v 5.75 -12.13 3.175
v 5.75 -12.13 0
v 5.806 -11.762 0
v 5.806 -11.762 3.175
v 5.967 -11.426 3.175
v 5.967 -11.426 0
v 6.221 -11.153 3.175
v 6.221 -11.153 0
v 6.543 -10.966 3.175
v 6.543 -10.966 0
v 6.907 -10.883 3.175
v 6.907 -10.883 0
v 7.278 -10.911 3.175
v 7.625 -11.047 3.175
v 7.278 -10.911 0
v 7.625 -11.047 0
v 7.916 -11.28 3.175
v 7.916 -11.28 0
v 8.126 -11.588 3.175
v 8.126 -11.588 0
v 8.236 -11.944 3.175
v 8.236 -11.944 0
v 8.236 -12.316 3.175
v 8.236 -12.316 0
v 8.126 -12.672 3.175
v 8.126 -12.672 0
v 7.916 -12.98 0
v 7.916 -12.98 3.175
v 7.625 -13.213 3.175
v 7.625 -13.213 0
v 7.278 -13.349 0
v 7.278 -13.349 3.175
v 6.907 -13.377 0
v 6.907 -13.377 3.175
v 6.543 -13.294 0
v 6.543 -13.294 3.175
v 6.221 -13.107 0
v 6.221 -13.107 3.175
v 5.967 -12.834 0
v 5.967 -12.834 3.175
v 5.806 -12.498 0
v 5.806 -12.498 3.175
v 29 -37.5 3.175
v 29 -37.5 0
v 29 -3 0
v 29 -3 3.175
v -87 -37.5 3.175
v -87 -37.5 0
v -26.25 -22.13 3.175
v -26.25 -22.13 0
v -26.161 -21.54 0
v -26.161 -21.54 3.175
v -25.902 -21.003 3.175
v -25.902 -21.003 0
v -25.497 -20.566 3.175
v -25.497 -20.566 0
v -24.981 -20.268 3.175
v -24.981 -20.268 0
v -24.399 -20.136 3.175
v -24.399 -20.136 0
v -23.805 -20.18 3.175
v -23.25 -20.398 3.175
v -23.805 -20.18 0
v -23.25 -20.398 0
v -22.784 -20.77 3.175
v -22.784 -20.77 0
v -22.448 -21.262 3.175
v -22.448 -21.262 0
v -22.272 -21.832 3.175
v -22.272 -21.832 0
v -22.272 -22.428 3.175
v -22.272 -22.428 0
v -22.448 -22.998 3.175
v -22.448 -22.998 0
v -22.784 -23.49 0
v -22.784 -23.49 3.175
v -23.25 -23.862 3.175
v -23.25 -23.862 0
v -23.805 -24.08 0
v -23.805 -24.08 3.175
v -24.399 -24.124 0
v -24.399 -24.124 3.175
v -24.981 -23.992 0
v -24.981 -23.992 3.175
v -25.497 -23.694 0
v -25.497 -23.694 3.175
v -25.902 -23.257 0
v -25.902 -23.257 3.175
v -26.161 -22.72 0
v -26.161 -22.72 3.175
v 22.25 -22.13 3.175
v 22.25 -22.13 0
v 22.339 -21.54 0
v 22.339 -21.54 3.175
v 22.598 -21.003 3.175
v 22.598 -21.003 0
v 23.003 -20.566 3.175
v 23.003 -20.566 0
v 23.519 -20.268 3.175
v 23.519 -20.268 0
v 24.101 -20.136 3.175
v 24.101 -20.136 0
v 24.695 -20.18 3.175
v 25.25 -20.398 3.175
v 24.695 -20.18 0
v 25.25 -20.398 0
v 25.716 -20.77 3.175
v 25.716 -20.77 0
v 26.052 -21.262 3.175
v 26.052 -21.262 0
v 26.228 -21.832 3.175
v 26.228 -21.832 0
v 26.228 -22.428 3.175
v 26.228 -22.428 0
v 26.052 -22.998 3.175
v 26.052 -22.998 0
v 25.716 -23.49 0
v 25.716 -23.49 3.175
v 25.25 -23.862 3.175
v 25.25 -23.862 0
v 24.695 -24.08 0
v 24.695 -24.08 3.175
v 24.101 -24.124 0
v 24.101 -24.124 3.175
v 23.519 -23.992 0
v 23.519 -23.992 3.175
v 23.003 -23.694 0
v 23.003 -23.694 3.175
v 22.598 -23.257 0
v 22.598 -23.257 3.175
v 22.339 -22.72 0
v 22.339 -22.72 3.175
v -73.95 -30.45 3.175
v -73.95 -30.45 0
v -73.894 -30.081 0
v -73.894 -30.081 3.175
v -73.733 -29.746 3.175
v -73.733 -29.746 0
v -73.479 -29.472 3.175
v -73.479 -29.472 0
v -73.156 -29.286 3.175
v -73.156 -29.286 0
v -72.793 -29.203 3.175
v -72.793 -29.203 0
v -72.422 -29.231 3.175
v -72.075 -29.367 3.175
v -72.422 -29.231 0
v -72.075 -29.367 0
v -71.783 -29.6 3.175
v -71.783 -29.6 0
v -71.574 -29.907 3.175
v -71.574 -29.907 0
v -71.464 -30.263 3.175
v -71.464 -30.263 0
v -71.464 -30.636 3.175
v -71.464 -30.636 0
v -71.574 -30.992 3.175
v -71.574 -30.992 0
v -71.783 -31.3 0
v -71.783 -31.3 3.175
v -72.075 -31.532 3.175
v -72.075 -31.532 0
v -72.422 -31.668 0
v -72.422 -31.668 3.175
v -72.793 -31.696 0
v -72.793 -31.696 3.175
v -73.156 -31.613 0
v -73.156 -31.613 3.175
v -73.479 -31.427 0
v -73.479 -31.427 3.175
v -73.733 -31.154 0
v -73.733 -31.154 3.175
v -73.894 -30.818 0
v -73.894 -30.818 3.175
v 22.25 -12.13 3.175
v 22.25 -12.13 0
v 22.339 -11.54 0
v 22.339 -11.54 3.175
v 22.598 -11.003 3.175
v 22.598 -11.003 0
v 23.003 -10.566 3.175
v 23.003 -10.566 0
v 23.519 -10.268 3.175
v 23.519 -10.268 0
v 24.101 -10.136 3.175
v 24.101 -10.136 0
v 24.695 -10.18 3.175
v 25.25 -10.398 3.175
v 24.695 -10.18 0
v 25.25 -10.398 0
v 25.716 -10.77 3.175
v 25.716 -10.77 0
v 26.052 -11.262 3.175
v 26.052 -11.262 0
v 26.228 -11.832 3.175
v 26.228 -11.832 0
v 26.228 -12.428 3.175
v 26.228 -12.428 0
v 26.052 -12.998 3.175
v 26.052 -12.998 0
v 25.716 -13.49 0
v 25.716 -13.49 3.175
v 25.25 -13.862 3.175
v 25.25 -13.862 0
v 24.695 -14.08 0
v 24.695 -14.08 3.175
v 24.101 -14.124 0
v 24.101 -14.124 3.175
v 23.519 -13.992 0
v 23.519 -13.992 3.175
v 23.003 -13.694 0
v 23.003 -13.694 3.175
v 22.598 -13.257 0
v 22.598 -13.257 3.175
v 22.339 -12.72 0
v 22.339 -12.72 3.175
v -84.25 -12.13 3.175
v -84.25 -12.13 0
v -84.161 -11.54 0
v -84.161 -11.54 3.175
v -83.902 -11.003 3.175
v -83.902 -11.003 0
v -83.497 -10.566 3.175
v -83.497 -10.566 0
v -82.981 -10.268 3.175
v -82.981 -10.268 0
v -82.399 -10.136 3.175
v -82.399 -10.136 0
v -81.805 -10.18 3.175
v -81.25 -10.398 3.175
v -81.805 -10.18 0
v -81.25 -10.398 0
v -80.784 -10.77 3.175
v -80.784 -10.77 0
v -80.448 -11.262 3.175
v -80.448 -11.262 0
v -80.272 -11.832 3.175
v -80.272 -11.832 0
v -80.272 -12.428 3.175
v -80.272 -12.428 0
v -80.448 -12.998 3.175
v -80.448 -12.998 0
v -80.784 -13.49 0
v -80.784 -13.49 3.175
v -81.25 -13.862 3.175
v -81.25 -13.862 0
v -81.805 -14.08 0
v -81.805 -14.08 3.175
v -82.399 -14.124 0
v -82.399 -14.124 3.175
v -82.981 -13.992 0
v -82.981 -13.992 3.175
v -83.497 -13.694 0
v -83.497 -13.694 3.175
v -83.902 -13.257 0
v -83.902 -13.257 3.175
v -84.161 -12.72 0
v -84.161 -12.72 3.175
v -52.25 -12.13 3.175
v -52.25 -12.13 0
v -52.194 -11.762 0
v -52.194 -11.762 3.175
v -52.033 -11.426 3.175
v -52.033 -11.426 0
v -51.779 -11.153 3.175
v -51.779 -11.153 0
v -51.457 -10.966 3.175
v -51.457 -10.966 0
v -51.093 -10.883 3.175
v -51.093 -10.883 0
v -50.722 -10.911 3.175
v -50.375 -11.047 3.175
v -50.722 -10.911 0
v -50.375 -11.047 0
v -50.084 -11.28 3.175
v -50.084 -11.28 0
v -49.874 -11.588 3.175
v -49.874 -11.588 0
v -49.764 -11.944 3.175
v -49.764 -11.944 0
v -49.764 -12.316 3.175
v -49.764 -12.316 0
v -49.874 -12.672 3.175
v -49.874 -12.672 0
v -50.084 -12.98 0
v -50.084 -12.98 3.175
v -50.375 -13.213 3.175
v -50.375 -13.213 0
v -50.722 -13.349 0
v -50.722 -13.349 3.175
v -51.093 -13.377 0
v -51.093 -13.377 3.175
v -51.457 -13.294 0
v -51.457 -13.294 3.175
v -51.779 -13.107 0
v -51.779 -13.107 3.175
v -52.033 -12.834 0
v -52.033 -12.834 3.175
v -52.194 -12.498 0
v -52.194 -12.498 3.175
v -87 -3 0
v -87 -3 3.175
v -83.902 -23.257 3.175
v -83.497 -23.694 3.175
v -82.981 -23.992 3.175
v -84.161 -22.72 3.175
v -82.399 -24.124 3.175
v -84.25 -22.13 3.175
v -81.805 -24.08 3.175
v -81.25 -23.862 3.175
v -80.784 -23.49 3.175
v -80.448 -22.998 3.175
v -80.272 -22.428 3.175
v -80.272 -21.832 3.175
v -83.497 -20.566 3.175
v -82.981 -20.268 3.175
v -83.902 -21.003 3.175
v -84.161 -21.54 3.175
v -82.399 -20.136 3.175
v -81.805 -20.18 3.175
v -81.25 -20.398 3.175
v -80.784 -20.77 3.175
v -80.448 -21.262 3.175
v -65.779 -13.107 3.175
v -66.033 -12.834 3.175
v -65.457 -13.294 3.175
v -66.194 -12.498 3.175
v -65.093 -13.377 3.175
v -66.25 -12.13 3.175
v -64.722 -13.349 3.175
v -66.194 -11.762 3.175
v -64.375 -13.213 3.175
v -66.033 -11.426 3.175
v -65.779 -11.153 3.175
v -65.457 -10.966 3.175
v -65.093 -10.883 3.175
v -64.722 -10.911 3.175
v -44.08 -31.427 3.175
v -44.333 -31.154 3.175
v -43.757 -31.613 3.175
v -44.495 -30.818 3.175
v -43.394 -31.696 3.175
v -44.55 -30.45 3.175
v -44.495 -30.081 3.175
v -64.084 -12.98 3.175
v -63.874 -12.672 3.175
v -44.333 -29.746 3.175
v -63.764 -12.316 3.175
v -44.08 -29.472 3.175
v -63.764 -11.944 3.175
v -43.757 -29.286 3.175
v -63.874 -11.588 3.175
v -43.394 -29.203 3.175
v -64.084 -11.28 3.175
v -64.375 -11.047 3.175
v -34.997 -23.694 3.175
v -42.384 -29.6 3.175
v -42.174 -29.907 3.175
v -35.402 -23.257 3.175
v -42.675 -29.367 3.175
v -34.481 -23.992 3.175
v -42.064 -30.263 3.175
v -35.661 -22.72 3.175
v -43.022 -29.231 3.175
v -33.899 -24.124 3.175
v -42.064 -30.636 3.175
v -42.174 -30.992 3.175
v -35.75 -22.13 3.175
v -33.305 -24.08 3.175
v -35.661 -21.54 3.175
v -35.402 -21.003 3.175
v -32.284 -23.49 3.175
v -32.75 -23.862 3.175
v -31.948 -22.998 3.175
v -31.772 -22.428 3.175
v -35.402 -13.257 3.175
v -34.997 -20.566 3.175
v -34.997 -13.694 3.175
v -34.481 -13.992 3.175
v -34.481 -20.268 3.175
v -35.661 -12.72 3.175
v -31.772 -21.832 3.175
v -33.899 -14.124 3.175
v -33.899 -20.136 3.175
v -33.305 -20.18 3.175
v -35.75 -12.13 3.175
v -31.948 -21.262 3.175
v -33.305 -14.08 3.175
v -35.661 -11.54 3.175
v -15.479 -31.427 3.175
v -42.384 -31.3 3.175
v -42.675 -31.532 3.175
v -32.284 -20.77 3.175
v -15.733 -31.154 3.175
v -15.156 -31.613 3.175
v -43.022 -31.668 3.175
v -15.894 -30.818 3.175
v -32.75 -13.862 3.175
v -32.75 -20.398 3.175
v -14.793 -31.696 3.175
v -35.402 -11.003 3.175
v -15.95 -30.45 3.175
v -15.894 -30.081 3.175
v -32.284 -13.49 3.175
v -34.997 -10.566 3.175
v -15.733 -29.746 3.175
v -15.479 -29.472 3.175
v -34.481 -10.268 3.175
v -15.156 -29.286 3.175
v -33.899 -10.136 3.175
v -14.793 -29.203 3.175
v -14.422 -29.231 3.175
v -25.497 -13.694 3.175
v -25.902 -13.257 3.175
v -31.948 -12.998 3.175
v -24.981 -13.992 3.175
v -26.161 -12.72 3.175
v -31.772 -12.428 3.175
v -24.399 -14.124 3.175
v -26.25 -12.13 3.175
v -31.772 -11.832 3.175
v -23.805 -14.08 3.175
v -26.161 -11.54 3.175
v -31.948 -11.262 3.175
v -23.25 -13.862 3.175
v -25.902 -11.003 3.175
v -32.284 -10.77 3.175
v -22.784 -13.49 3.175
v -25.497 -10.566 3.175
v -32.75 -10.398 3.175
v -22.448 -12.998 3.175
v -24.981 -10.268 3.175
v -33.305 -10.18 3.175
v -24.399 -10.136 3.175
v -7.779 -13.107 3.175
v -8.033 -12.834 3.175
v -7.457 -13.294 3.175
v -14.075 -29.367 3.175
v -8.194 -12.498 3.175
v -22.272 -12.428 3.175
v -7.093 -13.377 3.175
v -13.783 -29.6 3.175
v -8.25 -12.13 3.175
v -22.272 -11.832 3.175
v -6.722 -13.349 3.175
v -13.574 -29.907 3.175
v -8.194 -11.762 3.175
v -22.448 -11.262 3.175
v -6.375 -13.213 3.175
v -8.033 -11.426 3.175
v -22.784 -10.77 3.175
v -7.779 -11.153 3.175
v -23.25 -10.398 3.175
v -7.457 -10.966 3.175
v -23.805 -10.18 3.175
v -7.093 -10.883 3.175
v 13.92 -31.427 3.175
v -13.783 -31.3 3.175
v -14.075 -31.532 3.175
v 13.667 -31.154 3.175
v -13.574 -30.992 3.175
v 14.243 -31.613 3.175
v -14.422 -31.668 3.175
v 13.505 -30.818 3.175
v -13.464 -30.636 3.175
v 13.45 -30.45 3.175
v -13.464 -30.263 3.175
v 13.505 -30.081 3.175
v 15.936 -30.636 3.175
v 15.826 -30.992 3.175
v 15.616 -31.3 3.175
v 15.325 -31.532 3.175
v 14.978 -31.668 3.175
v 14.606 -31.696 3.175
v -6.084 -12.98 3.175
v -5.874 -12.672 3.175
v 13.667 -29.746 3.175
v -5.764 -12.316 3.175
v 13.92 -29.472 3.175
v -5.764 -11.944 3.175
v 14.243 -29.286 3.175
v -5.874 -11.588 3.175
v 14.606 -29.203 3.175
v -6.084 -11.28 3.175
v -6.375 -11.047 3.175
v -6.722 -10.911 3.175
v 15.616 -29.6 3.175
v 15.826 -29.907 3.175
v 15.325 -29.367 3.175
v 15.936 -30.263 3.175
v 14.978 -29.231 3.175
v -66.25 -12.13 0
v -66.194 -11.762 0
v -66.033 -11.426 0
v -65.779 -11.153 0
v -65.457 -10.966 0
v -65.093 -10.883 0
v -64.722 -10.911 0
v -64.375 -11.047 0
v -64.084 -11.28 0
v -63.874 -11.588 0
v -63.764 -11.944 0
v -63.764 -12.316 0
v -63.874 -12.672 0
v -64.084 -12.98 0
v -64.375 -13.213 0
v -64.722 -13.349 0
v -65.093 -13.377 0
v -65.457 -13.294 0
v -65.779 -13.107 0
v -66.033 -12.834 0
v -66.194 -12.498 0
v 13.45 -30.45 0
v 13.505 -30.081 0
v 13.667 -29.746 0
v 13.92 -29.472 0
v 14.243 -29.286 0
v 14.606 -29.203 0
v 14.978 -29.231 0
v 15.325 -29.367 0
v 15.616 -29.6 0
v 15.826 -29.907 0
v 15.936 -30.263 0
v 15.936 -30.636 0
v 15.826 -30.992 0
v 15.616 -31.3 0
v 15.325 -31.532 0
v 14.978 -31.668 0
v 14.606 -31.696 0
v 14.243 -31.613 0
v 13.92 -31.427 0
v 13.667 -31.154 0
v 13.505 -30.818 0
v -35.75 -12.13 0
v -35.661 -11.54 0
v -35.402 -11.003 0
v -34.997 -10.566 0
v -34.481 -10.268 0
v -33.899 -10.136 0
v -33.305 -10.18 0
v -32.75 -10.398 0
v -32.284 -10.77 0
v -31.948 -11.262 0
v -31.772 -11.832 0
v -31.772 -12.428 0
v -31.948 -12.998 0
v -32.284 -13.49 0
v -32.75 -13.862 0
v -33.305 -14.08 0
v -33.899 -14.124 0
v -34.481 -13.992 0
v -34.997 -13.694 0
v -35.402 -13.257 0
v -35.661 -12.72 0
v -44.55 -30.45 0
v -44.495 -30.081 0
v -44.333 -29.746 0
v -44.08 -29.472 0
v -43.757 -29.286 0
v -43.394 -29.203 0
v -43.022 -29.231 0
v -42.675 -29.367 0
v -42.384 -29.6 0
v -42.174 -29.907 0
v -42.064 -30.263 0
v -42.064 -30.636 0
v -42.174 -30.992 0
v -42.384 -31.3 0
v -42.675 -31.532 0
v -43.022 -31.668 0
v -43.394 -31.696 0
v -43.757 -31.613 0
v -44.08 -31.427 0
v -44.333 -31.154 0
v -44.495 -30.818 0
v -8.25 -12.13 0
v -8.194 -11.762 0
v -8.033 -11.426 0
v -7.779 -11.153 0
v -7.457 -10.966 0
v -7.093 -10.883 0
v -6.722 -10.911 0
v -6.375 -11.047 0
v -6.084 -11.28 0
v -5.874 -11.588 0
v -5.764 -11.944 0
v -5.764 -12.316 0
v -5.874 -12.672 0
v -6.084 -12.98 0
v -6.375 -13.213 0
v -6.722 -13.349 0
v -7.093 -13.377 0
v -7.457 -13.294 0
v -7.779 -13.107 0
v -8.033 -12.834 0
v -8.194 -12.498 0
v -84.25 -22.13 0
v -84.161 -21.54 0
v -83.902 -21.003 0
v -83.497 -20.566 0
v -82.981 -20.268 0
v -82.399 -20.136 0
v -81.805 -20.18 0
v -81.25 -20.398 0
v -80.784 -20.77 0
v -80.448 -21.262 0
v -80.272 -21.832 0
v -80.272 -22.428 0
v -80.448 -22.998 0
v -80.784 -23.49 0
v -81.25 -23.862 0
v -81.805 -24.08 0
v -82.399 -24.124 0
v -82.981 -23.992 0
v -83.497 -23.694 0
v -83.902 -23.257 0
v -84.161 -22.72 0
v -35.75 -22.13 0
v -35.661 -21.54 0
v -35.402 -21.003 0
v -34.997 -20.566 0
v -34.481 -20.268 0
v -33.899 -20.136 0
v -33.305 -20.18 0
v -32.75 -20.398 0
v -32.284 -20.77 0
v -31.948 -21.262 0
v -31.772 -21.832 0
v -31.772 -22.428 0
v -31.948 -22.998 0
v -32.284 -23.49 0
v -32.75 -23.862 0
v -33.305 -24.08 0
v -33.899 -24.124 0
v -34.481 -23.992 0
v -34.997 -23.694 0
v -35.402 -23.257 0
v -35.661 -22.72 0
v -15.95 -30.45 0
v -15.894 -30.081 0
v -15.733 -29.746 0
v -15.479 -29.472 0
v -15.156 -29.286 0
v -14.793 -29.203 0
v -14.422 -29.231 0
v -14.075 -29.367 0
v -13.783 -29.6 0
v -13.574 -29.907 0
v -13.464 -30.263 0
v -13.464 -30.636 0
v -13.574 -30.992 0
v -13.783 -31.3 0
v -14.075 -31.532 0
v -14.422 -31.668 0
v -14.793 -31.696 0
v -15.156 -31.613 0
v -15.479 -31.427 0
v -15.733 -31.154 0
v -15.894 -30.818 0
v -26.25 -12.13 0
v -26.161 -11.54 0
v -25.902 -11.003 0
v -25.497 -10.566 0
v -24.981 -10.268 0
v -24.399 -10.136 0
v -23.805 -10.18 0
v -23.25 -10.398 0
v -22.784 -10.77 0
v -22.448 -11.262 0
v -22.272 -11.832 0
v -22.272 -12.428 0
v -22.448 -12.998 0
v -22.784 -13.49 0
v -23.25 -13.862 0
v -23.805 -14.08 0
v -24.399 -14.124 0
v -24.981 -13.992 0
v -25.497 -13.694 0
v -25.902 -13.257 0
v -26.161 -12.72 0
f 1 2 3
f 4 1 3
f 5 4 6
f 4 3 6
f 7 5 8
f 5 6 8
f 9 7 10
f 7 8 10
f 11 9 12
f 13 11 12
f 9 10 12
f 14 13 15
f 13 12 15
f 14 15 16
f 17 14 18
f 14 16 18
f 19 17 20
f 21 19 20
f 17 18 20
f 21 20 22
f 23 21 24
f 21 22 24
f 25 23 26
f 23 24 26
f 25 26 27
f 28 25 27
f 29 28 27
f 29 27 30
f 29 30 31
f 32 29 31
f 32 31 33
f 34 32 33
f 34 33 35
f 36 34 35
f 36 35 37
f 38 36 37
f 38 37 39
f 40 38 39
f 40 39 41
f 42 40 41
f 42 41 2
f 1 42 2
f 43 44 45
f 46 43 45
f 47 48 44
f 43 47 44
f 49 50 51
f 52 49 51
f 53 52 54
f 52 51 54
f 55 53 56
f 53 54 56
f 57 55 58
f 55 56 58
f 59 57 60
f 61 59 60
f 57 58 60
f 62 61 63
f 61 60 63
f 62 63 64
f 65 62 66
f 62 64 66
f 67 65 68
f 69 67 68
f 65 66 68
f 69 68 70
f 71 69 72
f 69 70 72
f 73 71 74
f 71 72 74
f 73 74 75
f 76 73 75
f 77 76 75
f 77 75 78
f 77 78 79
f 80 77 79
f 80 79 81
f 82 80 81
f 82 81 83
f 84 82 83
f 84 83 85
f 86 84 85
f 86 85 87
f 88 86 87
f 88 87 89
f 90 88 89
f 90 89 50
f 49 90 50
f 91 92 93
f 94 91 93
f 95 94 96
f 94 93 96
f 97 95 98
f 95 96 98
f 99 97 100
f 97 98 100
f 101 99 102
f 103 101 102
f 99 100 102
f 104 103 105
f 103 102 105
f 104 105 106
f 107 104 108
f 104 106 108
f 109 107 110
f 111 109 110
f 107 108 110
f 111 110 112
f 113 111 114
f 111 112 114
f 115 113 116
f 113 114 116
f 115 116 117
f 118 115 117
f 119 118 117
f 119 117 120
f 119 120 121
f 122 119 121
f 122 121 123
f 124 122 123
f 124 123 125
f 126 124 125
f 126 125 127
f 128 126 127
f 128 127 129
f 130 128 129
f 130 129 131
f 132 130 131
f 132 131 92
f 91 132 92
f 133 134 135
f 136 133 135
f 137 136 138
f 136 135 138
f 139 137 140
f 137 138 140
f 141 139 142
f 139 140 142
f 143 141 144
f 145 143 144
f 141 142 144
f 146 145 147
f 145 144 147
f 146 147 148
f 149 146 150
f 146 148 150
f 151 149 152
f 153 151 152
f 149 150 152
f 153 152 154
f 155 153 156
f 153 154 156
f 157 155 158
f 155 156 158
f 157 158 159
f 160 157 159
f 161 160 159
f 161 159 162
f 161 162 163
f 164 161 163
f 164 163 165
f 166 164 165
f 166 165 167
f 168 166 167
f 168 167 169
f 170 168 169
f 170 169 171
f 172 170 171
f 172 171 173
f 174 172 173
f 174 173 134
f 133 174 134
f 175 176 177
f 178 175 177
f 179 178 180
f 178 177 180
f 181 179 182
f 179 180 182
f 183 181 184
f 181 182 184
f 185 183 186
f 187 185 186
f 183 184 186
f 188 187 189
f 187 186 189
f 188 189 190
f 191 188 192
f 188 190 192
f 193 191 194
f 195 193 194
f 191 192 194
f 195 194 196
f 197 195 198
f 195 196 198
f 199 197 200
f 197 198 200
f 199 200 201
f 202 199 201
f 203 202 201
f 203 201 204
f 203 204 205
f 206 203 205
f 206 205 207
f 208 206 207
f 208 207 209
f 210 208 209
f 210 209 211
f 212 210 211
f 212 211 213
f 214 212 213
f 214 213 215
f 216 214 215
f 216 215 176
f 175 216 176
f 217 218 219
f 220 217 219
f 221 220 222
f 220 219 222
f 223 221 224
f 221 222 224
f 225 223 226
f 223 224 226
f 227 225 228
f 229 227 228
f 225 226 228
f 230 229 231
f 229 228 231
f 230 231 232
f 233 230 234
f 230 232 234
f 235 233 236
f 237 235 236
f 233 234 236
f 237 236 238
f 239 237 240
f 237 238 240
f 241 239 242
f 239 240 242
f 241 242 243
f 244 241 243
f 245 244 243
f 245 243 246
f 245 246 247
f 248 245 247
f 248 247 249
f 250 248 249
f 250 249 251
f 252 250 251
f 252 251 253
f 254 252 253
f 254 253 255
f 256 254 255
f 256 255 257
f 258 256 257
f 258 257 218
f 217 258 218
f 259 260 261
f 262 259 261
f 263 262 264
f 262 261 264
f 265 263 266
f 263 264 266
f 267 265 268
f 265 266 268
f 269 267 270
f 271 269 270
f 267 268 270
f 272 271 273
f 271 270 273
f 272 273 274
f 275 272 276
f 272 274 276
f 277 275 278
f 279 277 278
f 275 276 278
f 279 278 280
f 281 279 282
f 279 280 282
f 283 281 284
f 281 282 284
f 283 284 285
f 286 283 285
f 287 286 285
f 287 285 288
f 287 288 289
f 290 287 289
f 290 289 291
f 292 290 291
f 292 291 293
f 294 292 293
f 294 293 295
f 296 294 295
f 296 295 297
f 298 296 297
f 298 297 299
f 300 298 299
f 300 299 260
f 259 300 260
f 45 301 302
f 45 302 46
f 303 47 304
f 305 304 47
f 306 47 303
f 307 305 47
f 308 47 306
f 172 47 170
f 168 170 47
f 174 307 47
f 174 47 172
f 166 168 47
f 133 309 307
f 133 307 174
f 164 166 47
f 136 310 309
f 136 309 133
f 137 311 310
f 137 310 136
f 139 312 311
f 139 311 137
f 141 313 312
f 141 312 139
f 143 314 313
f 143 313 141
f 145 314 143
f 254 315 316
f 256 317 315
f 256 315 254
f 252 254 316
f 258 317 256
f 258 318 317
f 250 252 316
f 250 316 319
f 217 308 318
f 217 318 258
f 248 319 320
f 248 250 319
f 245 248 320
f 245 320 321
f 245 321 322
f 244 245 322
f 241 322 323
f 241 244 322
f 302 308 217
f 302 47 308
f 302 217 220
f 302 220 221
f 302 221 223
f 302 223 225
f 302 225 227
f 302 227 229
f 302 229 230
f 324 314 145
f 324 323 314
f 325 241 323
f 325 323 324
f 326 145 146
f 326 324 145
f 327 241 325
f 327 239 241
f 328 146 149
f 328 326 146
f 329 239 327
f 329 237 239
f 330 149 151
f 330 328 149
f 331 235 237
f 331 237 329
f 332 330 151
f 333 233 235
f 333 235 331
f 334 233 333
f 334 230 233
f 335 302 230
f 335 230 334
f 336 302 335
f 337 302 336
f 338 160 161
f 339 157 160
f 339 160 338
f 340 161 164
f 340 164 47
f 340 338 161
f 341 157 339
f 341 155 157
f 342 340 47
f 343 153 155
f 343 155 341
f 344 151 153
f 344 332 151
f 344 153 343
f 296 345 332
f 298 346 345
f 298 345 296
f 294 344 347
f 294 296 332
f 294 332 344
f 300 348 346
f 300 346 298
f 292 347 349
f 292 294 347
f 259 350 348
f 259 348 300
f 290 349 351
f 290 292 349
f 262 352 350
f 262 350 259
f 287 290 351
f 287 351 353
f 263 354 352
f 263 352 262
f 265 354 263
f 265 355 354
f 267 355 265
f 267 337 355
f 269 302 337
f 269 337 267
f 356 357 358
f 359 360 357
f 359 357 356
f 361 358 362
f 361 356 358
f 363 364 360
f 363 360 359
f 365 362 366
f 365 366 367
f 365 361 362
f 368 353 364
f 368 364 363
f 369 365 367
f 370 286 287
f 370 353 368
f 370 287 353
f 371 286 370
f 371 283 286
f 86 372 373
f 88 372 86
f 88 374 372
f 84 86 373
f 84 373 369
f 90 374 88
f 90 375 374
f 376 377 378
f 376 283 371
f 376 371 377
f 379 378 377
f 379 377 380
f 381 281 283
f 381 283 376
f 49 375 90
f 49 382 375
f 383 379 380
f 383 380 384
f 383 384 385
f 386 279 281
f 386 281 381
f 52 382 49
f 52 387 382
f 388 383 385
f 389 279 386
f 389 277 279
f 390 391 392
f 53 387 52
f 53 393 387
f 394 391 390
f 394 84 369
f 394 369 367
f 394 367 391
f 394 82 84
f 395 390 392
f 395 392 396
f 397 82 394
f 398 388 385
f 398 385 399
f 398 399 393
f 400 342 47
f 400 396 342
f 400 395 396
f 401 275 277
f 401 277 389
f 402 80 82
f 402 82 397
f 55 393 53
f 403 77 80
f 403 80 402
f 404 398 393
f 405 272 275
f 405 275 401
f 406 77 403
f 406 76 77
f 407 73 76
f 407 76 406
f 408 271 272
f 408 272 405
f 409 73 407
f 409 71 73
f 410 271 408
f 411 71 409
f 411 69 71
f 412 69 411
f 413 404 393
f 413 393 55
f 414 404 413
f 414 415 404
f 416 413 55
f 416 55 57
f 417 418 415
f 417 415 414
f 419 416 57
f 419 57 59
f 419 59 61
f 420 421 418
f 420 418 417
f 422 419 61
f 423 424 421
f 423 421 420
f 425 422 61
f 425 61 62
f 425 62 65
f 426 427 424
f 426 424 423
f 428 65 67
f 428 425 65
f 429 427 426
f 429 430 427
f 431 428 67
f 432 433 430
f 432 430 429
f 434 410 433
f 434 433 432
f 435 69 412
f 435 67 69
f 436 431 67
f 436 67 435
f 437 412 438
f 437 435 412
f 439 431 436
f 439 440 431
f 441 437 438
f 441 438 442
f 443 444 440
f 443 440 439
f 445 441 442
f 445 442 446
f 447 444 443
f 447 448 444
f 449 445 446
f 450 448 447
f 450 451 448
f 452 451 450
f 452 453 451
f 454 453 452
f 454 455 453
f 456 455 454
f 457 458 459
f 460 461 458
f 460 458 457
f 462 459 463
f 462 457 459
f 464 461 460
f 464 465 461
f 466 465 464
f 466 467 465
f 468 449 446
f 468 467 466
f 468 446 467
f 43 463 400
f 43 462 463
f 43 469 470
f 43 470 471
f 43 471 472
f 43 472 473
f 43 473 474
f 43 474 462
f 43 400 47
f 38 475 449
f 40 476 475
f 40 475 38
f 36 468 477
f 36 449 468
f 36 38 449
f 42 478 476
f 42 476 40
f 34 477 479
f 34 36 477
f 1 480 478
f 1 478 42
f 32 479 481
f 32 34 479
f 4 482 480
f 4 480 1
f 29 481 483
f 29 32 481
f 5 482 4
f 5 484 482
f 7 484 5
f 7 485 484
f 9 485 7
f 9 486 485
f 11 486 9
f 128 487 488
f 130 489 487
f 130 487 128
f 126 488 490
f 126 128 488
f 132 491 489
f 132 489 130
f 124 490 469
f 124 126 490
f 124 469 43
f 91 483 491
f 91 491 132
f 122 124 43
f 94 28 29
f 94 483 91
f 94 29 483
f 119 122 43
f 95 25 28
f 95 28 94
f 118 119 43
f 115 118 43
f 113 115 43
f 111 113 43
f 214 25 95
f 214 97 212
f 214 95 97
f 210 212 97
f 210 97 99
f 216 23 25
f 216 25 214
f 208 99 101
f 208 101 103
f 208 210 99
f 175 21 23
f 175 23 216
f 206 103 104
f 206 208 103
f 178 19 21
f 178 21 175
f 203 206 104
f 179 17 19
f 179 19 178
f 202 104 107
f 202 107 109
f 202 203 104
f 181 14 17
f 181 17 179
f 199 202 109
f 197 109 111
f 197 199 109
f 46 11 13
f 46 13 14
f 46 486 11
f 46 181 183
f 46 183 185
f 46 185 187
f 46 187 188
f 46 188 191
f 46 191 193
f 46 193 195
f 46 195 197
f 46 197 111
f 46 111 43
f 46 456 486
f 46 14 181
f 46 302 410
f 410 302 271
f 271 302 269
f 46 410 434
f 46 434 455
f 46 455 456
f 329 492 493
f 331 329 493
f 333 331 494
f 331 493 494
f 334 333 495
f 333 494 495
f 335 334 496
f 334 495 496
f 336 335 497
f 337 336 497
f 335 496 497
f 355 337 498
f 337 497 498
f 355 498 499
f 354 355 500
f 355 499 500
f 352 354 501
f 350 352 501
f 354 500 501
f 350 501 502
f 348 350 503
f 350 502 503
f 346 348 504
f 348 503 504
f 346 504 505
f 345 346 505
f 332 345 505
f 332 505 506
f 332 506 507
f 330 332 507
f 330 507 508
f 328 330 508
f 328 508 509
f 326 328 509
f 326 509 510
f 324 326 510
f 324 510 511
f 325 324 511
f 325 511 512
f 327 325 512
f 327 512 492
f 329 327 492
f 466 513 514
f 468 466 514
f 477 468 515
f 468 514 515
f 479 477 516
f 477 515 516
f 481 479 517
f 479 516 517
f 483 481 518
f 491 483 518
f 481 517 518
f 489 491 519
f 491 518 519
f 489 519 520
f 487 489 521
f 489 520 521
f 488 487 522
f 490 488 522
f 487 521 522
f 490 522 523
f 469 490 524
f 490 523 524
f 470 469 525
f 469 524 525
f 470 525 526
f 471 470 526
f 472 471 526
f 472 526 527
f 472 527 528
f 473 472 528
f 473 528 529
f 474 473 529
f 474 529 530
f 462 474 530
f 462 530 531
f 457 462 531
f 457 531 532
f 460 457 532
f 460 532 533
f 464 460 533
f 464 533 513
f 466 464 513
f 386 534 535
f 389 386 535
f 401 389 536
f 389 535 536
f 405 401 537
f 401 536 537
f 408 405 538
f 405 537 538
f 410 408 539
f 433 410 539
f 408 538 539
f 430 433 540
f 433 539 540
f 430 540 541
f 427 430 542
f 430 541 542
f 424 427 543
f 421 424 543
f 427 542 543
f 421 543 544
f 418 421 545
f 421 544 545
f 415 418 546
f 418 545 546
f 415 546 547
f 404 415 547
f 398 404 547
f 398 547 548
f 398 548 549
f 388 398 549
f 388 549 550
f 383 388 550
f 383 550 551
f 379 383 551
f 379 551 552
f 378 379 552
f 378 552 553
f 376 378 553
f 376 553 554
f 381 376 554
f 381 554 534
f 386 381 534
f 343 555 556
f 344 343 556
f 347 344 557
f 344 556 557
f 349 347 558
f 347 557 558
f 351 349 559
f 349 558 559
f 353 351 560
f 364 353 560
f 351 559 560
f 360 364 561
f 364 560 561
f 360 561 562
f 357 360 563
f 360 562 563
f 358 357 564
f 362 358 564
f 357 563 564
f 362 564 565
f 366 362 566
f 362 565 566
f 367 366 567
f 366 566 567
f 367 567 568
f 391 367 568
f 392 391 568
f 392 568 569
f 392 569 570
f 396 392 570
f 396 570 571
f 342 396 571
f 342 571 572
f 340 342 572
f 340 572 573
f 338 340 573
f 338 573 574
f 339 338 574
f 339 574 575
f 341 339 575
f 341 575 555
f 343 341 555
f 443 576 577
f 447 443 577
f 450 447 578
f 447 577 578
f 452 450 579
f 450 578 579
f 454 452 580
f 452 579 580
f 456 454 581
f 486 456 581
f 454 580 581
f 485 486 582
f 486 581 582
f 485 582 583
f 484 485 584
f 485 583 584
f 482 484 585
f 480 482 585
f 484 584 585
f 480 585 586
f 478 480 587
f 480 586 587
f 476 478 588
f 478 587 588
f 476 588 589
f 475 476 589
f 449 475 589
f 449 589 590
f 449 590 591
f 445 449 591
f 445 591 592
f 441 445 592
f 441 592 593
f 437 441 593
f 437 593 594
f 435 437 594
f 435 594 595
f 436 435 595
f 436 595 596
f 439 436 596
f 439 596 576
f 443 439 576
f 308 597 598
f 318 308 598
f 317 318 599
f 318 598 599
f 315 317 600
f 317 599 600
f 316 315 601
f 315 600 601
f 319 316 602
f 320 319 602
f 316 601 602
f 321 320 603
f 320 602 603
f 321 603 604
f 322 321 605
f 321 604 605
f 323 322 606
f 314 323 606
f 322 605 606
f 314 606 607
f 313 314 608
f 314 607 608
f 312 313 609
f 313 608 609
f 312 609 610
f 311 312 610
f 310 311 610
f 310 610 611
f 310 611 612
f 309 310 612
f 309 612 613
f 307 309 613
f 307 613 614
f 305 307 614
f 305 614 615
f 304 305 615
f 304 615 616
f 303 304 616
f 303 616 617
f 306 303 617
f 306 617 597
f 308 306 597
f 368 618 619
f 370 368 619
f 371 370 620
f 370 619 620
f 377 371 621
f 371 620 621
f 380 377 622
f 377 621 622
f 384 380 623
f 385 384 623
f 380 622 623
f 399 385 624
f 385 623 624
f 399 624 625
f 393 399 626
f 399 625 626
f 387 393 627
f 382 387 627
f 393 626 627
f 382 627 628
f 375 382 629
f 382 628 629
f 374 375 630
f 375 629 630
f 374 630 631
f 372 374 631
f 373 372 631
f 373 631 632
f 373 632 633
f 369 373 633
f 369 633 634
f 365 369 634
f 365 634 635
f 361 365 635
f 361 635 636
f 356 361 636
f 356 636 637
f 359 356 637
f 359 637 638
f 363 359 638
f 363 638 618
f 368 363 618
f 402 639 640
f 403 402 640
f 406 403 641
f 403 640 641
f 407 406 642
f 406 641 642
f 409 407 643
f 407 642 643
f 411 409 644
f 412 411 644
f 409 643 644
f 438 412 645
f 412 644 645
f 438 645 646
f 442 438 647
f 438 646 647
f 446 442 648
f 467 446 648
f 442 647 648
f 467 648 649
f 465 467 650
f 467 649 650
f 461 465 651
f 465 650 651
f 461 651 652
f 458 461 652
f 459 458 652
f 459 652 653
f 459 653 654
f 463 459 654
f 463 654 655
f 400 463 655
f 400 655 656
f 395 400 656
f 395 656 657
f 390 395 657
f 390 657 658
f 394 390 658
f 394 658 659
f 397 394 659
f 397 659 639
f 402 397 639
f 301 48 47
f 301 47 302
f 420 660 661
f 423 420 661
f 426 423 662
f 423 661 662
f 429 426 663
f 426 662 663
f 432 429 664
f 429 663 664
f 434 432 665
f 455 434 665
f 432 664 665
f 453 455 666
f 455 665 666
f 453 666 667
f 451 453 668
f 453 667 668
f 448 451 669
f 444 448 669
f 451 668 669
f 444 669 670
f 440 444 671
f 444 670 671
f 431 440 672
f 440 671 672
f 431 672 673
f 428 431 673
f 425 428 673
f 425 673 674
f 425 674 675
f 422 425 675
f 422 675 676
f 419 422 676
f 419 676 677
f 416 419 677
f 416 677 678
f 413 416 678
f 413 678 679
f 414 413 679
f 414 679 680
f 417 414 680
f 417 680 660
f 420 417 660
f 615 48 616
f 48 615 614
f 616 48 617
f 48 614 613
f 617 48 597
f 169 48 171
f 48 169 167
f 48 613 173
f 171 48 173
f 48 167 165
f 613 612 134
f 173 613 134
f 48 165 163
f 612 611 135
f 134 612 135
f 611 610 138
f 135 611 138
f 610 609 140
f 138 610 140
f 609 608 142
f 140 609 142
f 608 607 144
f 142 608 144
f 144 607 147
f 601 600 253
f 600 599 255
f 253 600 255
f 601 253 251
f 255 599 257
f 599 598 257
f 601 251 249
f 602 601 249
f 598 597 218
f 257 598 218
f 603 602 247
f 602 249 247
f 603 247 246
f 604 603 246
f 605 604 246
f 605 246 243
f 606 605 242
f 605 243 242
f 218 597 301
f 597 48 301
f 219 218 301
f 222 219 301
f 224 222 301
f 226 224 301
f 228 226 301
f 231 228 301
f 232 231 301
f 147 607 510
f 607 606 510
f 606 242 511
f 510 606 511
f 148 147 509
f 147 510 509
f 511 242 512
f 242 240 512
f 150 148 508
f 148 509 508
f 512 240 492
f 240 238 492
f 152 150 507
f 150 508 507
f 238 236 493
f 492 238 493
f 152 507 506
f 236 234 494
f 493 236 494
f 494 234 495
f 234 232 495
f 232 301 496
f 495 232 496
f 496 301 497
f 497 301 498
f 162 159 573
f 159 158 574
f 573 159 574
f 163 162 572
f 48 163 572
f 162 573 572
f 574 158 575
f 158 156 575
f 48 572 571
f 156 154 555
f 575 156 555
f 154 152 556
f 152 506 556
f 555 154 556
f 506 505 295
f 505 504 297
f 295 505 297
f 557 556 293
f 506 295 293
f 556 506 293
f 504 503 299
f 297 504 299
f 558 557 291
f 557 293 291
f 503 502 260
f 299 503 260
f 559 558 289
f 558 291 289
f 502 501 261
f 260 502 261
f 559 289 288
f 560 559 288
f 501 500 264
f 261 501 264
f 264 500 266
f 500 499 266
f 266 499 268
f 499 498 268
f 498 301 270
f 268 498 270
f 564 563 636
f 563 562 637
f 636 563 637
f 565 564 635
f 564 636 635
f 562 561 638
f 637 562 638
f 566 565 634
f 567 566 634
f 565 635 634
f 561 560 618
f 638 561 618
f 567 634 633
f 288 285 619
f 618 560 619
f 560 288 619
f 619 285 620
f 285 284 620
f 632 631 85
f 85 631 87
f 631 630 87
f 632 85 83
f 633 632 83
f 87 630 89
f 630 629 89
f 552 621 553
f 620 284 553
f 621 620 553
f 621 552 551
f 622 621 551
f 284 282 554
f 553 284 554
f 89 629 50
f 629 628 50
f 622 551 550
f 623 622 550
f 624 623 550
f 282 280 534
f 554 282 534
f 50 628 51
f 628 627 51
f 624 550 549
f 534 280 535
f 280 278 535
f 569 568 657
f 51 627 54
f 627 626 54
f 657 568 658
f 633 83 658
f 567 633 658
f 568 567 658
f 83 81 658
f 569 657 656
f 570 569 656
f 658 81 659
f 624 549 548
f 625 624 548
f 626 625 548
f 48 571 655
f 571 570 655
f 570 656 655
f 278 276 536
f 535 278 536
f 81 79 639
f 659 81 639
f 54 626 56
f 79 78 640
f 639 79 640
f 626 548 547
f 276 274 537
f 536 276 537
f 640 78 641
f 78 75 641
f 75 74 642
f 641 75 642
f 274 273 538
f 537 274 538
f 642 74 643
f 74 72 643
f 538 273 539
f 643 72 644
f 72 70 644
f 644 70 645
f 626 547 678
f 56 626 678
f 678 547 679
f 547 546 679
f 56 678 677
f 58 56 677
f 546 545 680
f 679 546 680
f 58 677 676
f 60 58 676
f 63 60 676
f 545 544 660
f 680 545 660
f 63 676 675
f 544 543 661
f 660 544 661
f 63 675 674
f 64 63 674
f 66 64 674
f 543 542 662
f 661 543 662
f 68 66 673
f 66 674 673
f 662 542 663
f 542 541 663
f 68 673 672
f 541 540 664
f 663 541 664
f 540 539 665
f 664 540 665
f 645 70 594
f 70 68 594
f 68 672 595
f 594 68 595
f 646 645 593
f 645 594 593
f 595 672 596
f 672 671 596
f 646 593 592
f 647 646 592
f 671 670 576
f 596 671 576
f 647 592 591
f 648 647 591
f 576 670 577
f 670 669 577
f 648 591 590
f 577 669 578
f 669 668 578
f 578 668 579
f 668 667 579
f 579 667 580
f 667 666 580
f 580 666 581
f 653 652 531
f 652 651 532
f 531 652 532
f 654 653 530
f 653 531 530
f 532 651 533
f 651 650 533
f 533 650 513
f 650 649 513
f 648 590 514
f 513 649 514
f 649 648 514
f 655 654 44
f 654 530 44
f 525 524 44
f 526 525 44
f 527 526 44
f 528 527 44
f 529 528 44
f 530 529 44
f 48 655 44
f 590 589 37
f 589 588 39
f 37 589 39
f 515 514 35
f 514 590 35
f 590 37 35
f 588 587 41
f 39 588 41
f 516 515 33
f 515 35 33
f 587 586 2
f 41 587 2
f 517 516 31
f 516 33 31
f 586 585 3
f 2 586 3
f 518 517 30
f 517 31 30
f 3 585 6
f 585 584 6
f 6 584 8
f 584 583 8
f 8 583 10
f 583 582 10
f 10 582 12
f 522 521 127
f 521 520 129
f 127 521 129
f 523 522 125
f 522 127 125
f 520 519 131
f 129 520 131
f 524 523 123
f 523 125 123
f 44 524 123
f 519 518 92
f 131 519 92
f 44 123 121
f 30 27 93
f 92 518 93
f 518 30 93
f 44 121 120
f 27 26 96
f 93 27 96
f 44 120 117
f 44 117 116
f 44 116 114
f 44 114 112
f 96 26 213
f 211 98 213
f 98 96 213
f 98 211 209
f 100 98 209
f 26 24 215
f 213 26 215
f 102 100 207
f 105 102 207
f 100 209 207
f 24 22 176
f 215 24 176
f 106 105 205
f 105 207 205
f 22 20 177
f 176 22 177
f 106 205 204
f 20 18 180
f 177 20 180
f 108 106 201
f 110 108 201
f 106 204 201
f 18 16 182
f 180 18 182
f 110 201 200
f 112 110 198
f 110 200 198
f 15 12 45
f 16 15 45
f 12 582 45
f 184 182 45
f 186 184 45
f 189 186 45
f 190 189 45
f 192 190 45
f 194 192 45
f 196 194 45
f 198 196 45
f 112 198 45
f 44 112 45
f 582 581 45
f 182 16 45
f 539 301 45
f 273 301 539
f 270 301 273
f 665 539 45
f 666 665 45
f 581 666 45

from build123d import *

# Parameters (mm, degrees)
SKETCH1_W           = 116
SKETCH1_H           = 34.5
BOSS_EXTRUDE1_DEPTH = 3.175
SKETCH2_R           = 2
SKETCH2_R_2         = 1.25
CUT_EXTRUDE1_DEPTH  = 95.79098388


with BuildPart() as part:
    # Sketch1 → Boss-Extrude1 (new body)
    with BuildSketch(Plane.XY):
        with Locations((-29, -20.25)):
            Rectangle(SKETCH1_W, SKETCH1_H)
    extrude(amount=BOSS_EXTRUDE1_DEPTH)

    # Sketch2 → Cut-Extrude1 (cut, through all)
    with BuildSketch(Plane(origin=(0, 0, 0), x_dir=(-1, 0, 0), z_dir=(0, 0, -1))):
        with Locations((-24.25, -22.13)):
            Circle(SKETCH2_R)
        with Locations((-24.25, -12.13)):
            Circle(SKETCH2_R)
        with Locations((24.25, -12.13)):
            Circle(SKETCH2_R)
        with Locations((24.25, -22.13)):
            Circle(SKETCH2_R)
        with Locations((33.75, -12.13)):
            Circle(SKETCH2_R)
        with Locations((33.75, -22.13)):
            Circle(SKETCH2_R)
        with Locations((82.25, -12.13)):
            Circle(SKETCH2_R)
        with Locations((82.25, -22.13)):
            Circle(SKETCH2_R)
        with Locations((72.699747468, -30.449747468)):
            Circle(SKETCH2_R_2)
        with Locations((65, -12.13)):
            Circle(SKETCH2_R_2)
        with Locations((51, -12.13)):
            Circle(SKETCH2_R_2)
        with Locations((43.300252532, -30.449747468)):
            Circle(SKETCH2_R_2)
        with Locations((14.699747468, -30.449747468)):
            Circle(SKETCH2_R_2)
        with Locations((7, -12.13)):
            Circle(SKETCH2_R_2)
        with Locations((-7, -12.13)):
            Circle(SKETCH2_R_2)
        with Locations((-14.699747468, -30.449747468)):
            Circle(SKETCH2_R_2)
    extrude(amount=-CUT_EXTRUDE1_DEPTH, mode=Mode.SUBTRACT)


solid = part.part
